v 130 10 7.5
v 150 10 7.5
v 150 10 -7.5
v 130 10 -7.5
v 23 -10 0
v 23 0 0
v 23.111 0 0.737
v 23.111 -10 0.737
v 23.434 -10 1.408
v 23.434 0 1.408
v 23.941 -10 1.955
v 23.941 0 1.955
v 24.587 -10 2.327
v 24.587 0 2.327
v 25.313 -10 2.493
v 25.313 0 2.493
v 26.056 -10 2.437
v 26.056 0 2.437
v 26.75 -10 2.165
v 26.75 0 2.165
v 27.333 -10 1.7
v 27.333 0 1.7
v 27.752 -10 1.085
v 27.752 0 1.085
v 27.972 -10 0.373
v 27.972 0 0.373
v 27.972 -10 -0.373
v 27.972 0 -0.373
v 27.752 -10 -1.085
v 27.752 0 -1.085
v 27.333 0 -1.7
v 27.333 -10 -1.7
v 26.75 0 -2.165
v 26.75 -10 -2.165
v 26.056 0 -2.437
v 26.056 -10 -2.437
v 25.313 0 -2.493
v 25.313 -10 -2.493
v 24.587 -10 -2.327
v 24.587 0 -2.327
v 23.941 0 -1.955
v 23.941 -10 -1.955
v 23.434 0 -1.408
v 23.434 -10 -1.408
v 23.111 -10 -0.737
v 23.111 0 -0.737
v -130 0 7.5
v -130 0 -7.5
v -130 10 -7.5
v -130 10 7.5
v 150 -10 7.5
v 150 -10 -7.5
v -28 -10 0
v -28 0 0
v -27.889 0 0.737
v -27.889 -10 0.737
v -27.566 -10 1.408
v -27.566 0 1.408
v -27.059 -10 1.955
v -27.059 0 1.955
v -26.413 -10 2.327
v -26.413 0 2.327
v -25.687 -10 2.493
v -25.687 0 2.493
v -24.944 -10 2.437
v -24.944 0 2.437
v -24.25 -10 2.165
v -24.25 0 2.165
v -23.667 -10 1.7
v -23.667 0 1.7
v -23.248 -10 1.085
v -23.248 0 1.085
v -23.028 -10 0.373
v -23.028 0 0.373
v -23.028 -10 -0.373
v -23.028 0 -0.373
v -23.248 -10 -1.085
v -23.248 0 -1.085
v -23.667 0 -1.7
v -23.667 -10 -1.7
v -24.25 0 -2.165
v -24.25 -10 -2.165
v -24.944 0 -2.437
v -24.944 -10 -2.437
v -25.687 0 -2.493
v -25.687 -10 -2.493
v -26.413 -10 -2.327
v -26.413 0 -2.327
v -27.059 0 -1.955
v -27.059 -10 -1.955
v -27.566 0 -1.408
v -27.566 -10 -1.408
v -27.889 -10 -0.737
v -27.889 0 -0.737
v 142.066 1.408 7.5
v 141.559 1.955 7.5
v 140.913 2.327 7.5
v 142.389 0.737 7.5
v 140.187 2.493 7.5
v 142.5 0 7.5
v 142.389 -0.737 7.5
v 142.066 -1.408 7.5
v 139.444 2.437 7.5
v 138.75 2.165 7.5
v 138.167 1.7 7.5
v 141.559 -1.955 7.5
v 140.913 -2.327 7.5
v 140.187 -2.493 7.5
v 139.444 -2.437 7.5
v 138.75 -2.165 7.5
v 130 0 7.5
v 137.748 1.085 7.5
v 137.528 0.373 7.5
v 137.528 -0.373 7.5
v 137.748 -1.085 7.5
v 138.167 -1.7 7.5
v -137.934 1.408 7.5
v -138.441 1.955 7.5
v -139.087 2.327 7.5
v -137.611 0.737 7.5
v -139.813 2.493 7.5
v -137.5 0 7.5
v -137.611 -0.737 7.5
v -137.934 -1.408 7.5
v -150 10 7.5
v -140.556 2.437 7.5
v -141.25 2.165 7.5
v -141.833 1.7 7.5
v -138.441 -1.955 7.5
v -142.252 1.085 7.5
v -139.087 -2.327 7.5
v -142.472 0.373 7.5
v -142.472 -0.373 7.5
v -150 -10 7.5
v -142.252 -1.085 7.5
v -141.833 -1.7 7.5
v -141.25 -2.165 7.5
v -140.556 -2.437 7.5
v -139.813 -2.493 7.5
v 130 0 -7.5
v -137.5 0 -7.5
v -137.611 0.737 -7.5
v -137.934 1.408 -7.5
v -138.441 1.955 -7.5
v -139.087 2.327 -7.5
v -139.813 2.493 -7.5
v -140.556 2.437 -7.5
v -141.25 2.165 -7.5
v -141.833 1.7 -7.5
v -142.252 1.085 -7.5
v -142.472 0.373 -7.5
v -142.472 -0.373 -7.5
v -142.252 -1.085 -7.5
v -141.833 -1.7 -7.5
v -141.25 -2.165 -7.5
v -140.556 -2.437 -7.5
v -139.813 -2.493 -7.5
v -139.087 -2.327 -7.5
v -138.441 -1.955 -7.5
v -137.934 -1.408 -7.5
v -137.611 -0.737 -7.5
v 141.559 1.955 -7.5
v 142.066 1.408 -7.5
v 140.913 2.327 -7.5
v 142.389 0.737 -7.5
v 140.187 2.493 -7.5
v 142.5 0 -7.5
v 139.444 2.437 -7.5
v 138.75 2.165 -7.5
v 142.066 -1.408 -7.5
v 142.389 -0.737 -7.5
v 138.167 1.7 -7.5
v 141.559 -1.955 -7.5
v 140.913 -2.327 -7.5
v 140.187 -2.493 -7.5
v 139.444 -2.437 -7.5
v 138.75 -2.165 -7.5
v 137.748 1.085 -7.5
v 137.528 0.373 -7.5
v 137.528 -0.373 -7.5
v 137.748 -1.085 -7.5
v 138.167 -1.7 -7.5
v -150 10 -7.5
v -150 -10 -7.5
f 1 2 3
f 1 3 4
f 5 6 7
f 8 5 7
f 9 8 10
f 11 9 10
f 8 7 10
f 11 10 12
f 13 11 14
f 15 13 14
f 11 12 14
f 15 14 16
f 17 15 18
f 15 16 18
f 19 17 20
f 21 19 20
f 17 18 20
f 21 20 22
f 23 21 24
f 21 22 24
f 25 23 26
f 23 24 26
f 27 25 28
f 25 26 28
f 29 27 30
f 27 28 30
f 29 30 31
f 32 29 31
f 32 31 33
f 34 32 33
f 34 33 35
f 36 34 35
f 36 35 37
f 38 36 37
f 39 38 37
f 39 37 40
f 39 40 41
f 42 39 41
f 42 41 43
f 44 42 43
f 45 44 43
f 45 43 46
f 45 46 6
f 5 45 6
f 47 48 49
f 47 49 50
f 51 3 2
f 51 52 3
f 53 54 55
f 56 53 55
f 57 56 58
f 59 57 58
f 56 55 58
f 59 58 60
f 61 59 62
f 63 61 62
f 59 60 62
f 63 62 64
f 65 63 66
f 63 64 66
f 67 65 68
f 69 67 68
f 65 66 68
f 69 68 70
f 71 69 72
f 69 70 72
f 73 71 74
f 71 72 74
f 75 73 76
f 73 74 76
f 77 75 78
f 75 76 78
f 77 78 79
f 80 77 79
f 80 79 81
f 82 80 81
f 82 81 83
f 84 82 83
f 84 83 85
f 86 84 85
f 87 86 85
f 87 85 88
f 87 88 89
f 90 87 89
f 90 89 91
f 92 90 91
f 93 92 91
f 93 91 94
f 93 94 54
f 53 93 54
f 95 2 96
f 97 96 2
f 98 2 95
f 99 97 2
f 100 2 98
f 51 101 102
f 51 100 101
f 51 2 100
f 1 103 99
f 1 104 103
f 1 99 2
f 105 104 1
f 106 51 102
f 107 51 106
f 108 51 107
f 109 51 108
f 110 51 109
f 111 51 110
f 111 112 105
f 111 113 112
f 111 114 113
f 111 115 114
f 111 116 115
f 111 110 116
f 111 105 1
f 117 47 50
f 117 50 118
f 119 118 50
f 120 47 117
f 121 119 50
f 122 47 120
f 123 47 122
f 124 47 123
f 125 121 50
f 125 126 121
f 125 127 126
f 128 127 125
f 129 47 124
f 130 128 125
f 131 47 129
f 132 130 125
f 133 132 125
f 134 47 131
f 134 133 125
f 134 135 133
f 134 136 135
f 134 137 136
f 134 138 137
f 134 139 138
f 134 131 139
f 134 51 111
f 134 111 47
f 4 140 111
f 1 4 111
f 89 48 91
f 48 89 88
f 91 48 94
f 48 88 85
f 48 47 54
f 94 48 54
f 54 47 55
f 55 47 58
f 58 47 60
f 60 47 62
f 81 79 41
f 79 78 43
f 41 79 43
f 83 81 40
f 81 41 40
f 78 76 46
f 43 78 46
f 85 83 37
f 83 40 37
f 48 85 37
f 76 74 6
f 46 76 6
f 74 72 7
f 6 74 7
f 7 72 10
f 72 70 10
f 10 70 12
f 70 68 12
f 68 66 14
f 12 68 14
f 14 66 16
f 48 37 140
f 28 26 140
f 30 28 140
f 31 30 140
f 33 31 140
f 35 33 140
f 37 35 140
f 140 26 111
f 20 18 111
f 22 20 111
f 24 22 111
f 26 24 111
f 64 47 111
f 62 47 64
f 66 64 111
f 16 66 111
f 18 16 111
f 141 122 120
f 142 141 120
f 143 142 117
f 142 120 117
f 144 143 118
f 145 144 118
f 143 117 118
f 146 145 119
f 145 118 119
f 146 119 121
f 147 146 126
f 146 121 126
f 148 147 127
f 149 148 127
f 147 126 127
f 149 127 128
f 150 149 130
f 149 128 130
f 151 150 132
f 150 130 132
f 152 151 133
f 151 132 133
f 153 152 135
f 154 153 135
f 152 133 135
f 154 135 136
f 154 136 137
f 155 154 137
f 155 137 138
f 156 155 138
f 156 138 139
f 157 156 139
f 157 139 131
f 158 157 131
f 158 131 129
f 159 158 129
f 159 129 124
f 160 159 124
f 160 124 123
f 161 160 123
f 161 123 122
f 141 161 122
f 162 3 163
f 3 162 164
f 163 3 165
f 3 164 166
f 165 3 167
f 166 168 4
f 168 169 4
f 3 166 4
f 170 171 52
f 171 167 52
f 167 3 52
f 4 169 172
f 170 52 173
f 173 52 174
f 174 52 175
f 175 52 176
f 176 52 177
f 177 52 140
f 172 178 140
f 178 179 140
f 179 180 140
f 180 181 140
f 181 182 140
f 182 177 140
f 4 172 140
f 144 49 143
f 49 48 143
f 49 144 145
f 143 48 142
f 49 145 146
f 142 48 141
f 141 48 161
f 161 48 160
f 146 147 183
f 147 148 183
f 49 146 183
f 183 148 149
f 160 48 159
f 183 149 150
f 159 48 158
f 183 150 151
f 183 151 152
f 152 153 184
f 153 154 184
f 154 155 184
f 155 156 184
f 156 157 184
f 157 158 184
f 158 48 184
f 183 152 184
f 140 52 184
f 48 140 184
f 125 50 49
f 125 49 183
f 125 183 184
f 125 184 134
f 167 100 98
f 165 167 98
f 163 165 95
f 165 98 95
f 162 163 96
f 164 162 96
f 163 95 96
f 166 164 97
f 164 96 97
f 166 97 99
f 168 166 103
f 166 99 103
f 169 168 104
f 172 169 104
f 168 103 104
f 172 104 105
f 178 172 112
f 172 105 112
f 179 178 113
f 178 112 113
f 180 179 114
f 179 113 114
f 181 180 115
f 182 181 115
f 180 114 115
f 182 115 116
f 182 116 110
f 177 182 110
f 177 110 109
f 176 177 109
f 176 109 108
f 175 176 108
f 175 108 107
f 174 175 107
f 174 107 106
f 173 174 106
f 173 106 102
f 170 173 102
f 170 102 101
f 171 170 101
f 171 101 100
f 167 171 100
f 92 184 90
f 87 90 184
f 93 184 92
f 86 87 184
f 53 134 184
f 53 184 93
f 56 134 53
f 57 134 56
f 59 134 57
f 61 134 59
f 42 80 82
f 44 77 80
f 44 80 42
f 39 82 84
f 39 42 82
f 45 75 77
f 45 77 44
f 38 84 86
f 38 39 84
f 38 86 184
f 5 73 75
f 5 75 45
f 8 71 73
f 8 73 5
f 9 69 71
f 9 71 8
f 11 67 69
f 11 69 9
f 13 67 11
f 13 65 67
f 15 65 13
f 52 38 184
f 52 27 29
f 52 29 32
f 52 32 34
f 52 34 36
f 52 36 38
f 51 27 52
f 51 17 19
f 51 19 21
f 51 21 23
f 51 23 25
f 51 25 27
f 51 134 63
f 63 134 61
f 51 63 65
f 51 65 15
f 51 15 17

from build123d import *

# Parameters (mm, degrees)
F0_W     = 300
F0_H     = 15
F1_DEPTH = 10
F2_W     = 20
F2_H     = 15
F3_DEPTH = 10
F4_R     = 2.5
F5_DEPTH = 25
F6_R     = 2.5
F7_DEPTH = 25


with BuildPart() as f1:
    # F0 (on Front) → F1 (new body)
    with BuildSketch(Plane.XZ):
        Rectangle(F0_W, F0_H)
    extrude(amount=F1_DEPTH)

    # F2 (on face) → F3 (join)
    with BuildSketch(Plane(origin=(0, 0, 0), x_dir=(-1, 0, 0), z_dir=(0, 1, 0))):
        with Locations((-140, 0)):
            Rectangle(F2_W, F2_H)
        with Locations((140, 0)):
            Rectangle(F2_W, F2_H)
    extrude(amount=F3_DEPTH)

    # F4 (on face) → F5 (cut)
    with BuildSketch(Plane.XY.offset(7.5)):
        with Locations((140, 0)):
            Circle(F4_R)
        with Locations((-140, 0)):
            Circle(F4_R)
    extrude(amount=-F5_DEPTH, mode=Mode.SUBTRACT)

    # F6 (on face) → F7 (cut)
    with BuildSketch(Plane(origin=(0, 0, 0), x_dir=(-1, 0, 0), z_dir=(0, 1, 0))):
        with Locations((-25.5, 0)):
            Circle(F6_R)
        with Locations((25.5, 0)):
            Circle(F6_R)
    extrude(amount=-F7_DEPTH, mode=Mode.SUBTRACT)


solid = f1.part
